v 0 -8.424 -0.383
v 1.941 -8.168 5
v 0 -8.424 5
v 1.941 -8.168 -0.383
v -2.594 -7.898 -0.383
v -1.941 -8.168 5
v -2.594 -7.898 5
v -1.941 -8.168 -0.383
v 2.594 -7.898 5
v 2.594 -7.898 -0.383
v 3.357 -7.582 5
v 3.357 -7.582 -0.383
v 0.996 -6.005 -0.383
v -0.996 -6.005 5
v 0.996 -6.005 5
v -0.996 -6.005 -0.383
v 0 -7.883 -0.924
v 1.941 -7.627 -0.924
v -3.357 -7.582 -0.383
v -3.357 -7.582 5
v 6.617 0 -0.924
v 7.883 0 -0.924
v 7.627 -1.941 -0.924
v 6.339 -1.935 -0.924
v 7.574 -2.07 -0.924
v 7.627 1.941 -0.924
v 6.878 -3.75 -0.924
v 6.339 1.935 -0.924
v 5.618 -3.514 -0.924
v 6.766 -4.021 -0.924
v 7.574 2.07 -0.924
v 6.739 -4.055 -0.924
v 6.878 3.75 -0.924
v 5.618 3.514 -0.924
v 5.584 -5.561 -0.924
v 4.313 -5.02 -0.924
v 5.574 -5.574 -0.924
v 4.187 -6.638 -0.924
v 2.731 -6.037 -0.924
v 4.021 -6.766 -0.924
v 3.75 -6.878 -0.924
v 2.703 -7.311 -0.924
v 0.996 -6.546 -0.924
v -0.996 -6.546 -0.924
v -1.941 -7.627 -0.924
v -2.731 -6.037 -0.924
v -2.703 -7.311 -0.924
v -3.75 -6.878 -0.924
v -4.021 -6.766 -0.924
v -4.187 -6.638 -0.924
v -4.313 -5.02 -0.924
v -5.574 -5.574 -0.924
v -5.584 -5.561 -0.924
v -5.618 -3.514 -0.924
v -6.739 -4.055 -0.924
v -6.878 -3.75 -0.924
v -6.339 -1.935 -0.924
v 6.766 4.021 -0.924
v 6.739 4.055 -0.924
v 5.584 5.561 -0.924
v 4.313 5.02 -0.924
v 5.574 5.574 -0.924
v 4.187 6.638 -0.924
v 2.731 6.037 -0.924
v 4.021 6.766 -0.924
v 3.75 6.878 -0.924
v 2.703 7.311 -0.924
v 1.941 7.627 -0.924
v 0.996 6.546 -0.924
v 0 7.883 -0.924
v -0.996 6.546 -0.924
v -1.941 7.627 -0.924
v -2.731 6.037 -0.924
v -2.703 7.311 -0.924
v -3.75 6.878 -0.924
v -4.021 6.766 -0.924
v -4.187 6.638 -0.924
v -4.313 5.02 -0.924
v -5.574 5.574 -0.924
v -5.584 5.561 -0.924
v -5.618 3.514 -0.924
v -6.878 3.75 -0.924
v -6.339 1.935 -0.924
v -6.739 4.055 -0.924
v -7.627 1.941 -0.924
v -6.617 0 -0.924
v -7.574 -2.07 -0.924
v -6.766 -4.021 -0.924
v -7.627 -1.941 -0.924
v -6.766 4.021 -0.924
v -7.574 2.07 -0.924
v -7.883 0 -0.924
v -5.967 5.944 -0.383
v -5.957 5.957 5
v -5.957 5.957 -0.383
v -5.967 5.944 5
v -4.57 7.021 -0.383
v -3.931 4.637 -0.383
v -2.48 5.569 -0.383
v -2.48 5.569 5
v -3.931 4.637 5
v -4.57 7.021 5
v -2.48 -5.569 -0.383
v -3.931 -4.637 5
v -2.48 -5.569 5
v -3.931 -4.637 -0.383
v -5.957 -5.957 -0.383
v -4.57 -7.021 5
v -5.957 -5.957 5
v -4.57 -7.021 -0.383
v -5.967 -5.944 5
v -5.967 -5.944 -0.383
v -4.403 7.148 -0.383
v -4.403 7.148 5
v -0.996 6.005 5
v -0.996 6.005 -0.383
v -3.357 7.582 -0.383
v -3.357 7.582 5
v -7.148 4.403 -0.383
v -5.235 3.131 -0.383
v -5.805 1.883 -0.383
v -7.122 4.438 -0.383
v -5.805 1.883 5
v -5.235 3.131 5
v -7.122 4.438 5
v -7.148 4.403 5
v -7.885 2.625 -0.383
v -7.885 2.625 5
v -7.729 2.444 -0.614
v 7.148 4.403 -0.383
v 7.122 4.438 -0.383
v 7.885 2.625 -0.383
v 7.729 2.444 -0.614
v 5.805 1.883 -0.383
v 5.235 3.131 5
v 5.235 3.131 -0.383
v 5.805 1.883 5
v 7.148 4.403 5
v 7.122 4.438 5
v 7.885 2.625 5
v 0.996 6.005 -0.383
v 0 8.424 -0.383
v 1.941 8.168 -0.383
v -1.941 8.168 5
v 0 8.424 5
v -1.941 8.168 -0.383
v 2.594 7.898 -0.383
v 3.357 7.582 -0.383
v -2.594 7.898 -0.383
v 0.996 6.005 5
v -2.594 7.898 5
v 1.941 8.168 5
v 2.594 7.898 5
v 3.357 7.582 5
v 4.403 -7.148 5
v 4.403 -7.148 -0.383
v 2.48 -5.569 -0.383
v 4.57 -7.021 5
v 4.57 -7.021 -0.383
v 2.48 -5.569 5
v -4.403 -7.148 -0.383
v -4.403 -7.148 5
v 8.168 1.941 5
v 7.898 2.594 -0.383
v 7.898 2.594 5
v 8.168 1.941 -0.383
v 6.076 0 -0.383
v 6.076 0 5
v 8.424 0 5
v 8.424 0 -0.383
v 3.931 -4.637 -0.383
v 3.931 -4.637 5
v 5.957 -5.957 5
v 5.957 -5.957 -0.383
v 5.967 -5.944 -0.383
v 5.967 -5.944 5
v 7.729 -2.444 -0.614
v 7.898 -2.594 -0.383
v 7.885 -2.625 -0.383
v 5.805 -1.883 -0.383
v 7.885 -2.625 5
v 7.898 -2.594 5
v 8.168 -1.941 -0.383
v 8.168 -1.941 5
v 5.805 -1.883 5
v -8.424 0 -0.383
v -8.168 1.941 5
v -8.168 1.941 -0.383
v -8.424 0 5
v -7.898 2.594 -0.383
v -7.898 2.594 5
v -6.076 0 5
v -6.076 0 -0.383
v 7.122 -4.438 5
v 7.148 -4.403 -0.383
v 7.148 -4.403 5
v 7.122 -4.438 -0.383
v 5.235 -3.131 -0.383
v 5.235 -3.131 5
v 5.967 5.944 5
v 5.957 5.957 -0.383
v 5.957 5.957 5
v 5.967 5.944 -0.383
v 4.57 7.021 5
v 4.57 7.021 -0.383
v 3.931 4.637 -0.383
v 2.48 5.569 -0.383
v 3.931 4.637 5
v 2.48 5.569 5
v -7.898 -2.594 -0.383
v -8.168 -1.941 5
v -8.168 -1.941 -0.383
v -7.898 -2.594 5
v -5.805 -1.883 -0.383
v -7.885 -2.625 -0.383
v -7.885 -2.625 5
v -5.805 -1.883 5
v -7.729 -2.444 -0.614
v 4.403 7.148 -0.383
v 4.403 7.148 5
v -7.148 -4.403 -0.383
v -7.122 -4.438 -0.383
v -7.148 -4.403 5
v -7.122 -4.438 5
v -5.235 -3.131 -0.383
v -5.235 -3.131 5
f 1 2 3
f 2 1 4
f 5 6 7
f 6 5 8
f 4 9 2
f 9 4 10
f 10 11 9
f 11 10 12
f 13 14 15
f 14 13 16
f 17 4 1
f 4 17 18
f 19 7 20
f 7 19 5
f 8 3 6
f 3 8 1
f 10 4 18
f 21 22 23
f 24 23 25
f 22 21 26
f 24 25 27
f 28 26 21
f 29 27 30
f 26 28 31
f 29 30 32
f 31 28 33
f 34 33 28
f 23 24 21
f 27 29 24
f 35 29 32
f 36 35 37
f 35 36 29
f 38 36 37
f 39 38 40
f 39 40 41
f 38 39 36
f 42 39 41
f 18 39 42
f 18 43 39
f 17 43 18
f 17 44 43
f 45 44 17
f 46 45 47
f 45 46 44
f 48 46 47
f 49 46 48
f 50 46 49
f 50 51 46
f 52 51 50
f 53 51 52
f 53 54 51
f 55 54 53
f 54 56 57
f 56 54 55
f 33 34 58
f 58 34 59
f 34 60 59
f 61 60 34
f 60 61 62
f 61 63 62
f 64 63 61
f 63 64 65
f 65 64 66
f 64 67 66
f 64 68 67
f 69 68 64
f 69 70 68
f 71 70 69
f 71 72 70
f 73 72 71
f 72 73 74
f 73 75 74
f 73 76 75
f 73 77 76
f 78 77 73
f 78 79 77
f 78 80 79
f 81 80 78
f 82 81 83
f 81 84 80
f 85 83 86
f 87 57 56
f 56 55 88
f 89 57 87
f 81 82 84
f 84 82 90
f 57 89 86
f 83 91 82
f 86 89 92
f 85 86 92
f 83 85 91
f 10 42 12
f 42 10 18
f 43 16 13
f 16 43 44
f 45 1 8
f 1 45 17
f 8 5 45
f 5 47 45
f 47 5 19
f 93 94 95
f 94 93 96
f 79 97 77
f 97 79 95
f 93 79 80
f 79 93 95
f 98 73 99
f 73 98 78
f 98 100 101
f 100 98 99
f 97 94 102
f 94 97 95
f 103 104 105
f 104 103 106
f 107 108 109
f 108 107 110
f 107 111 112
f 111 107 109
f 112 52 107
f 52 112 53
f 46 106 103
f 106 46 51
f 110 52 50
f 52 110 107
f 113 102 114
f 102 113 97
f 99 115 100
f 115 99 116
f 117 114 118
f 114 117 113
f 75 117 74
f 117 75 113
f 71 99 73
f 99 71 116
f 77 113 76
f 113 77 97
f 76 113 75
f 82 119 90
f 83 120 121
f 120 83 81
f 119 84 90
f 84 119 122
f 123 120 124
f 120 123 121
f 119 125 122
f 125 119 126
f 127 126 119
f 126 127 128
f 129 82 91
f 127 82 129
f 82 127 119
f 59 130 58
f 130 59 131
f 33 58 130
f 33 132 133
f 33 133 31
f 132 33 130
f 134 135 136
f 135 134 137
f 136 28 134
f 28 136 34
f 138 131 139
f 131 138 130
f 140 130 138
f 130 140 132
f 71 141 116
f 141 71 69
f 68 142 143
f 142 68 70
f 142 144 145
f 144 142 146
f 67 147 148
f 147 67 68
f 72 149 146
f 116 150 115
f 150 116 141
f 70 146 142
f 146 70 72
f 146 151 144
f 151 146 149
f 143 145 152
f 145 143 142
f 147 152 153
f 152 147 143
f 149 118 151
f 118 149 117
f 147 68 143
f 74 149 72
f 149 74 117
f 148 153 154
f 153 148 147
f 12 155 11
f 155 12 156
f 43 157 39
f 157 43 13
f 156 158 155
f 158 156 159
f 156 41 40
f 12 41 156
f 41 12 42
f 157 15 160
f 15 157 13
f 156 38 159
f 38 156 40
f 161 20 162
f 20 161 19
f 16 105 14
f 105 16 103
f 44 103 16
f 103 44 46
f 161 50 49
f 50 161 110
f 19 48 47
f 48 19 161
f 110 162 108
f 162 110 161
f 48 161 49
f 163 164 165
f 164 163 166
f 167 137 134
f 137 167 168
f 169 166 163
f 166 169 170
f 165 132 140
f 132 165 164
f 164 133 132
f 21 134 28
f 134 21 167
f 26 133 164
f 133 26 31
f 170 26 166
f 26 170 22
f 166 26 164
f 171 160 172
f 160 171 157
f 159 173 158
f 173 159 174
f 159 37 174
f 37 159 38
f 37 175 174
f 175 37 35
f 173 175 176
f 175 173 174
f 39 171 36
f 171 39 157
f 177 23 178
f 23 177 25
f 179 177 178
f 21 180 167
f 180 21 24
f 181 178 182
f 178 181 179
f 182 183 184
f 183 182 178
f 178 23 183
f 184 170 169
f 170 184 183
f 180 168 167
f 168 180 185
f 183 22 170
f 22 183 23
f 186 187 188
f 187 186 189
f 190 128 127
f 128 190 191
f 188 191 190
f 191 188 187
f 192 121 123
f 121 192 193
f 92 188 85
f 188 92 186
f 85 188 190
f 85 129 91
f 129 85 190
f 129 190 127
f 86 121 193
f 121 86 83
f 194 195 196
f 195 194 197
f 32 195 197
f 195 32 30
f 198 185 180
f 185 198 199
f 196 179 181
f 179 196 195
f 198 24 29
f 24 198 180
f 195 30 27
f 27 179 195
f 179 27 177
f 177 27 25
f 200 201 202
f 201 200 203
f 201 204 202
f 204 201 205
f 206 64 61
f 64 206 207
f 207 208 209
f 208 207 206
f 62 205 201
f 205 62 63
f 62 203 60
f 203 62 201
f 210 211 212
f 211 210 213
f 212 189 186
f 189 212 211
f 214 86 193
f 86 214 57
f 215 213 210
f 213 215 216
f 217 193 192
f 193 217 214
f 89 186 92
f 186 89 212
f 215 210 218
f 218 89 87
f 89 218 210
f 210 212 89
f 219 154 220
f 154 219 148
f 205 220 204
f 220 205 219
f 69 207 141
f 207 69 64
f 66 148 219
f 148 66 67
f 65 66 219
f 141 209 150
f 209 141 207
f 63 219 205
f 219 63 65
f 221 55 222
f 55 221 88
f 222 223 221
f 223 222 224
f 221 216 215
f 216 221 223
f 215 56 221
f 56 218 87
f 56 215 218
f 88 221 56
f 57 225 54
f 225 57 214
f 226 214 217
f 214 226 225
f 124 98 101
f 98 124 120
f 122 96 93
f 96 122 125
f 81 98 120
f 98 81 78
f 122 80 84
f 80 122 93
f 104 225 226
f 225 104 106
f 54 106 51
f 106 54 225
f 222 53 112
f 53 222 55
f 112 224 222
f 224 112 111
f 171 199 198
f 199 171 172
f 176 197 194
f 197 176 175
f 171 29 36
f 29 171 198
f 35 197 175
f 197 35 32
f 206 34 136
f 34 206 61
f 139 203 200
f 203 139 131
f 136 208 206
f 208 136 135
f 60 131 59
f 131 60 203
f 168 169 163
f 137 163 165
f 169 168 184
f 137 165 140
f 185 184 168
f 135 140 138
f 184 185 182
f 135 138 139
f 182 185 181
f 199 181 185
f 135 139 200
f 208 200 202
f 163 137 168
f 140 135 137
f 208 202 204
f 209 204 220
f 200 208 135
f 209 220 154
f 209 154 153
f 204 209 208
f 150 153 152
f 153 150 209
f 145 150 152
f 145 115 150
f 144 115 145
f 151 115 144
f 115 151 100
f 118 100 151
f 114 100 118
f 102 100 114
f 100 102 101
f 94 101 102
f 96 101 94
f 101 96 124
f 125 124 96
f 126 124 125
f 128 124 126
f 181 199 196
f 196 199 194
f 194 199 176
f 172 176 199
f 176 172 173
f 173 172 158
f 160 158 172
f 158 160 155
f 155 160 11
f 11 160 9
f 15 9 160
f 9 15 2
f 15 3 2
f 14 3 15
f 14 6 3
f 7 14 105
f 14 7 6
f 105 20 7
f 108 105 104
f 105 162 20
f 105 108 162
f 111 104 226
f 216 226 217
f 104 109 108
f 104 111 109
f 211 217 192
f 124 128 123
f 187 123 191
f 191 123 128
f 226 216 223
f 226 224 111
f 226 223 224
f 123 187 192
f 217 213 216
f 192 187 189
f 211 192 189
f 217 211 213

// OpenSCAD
difference(){
  minkowski(convexity=2){
    difference(){
      cylinder(h=10, d=15);
      translate([0,0,-0.1]) cylinder(h=11, d=14);
    }
    sphere(1, $fn=8);
  }
  translate([0,0,15]) cube(20, center=true);
}
